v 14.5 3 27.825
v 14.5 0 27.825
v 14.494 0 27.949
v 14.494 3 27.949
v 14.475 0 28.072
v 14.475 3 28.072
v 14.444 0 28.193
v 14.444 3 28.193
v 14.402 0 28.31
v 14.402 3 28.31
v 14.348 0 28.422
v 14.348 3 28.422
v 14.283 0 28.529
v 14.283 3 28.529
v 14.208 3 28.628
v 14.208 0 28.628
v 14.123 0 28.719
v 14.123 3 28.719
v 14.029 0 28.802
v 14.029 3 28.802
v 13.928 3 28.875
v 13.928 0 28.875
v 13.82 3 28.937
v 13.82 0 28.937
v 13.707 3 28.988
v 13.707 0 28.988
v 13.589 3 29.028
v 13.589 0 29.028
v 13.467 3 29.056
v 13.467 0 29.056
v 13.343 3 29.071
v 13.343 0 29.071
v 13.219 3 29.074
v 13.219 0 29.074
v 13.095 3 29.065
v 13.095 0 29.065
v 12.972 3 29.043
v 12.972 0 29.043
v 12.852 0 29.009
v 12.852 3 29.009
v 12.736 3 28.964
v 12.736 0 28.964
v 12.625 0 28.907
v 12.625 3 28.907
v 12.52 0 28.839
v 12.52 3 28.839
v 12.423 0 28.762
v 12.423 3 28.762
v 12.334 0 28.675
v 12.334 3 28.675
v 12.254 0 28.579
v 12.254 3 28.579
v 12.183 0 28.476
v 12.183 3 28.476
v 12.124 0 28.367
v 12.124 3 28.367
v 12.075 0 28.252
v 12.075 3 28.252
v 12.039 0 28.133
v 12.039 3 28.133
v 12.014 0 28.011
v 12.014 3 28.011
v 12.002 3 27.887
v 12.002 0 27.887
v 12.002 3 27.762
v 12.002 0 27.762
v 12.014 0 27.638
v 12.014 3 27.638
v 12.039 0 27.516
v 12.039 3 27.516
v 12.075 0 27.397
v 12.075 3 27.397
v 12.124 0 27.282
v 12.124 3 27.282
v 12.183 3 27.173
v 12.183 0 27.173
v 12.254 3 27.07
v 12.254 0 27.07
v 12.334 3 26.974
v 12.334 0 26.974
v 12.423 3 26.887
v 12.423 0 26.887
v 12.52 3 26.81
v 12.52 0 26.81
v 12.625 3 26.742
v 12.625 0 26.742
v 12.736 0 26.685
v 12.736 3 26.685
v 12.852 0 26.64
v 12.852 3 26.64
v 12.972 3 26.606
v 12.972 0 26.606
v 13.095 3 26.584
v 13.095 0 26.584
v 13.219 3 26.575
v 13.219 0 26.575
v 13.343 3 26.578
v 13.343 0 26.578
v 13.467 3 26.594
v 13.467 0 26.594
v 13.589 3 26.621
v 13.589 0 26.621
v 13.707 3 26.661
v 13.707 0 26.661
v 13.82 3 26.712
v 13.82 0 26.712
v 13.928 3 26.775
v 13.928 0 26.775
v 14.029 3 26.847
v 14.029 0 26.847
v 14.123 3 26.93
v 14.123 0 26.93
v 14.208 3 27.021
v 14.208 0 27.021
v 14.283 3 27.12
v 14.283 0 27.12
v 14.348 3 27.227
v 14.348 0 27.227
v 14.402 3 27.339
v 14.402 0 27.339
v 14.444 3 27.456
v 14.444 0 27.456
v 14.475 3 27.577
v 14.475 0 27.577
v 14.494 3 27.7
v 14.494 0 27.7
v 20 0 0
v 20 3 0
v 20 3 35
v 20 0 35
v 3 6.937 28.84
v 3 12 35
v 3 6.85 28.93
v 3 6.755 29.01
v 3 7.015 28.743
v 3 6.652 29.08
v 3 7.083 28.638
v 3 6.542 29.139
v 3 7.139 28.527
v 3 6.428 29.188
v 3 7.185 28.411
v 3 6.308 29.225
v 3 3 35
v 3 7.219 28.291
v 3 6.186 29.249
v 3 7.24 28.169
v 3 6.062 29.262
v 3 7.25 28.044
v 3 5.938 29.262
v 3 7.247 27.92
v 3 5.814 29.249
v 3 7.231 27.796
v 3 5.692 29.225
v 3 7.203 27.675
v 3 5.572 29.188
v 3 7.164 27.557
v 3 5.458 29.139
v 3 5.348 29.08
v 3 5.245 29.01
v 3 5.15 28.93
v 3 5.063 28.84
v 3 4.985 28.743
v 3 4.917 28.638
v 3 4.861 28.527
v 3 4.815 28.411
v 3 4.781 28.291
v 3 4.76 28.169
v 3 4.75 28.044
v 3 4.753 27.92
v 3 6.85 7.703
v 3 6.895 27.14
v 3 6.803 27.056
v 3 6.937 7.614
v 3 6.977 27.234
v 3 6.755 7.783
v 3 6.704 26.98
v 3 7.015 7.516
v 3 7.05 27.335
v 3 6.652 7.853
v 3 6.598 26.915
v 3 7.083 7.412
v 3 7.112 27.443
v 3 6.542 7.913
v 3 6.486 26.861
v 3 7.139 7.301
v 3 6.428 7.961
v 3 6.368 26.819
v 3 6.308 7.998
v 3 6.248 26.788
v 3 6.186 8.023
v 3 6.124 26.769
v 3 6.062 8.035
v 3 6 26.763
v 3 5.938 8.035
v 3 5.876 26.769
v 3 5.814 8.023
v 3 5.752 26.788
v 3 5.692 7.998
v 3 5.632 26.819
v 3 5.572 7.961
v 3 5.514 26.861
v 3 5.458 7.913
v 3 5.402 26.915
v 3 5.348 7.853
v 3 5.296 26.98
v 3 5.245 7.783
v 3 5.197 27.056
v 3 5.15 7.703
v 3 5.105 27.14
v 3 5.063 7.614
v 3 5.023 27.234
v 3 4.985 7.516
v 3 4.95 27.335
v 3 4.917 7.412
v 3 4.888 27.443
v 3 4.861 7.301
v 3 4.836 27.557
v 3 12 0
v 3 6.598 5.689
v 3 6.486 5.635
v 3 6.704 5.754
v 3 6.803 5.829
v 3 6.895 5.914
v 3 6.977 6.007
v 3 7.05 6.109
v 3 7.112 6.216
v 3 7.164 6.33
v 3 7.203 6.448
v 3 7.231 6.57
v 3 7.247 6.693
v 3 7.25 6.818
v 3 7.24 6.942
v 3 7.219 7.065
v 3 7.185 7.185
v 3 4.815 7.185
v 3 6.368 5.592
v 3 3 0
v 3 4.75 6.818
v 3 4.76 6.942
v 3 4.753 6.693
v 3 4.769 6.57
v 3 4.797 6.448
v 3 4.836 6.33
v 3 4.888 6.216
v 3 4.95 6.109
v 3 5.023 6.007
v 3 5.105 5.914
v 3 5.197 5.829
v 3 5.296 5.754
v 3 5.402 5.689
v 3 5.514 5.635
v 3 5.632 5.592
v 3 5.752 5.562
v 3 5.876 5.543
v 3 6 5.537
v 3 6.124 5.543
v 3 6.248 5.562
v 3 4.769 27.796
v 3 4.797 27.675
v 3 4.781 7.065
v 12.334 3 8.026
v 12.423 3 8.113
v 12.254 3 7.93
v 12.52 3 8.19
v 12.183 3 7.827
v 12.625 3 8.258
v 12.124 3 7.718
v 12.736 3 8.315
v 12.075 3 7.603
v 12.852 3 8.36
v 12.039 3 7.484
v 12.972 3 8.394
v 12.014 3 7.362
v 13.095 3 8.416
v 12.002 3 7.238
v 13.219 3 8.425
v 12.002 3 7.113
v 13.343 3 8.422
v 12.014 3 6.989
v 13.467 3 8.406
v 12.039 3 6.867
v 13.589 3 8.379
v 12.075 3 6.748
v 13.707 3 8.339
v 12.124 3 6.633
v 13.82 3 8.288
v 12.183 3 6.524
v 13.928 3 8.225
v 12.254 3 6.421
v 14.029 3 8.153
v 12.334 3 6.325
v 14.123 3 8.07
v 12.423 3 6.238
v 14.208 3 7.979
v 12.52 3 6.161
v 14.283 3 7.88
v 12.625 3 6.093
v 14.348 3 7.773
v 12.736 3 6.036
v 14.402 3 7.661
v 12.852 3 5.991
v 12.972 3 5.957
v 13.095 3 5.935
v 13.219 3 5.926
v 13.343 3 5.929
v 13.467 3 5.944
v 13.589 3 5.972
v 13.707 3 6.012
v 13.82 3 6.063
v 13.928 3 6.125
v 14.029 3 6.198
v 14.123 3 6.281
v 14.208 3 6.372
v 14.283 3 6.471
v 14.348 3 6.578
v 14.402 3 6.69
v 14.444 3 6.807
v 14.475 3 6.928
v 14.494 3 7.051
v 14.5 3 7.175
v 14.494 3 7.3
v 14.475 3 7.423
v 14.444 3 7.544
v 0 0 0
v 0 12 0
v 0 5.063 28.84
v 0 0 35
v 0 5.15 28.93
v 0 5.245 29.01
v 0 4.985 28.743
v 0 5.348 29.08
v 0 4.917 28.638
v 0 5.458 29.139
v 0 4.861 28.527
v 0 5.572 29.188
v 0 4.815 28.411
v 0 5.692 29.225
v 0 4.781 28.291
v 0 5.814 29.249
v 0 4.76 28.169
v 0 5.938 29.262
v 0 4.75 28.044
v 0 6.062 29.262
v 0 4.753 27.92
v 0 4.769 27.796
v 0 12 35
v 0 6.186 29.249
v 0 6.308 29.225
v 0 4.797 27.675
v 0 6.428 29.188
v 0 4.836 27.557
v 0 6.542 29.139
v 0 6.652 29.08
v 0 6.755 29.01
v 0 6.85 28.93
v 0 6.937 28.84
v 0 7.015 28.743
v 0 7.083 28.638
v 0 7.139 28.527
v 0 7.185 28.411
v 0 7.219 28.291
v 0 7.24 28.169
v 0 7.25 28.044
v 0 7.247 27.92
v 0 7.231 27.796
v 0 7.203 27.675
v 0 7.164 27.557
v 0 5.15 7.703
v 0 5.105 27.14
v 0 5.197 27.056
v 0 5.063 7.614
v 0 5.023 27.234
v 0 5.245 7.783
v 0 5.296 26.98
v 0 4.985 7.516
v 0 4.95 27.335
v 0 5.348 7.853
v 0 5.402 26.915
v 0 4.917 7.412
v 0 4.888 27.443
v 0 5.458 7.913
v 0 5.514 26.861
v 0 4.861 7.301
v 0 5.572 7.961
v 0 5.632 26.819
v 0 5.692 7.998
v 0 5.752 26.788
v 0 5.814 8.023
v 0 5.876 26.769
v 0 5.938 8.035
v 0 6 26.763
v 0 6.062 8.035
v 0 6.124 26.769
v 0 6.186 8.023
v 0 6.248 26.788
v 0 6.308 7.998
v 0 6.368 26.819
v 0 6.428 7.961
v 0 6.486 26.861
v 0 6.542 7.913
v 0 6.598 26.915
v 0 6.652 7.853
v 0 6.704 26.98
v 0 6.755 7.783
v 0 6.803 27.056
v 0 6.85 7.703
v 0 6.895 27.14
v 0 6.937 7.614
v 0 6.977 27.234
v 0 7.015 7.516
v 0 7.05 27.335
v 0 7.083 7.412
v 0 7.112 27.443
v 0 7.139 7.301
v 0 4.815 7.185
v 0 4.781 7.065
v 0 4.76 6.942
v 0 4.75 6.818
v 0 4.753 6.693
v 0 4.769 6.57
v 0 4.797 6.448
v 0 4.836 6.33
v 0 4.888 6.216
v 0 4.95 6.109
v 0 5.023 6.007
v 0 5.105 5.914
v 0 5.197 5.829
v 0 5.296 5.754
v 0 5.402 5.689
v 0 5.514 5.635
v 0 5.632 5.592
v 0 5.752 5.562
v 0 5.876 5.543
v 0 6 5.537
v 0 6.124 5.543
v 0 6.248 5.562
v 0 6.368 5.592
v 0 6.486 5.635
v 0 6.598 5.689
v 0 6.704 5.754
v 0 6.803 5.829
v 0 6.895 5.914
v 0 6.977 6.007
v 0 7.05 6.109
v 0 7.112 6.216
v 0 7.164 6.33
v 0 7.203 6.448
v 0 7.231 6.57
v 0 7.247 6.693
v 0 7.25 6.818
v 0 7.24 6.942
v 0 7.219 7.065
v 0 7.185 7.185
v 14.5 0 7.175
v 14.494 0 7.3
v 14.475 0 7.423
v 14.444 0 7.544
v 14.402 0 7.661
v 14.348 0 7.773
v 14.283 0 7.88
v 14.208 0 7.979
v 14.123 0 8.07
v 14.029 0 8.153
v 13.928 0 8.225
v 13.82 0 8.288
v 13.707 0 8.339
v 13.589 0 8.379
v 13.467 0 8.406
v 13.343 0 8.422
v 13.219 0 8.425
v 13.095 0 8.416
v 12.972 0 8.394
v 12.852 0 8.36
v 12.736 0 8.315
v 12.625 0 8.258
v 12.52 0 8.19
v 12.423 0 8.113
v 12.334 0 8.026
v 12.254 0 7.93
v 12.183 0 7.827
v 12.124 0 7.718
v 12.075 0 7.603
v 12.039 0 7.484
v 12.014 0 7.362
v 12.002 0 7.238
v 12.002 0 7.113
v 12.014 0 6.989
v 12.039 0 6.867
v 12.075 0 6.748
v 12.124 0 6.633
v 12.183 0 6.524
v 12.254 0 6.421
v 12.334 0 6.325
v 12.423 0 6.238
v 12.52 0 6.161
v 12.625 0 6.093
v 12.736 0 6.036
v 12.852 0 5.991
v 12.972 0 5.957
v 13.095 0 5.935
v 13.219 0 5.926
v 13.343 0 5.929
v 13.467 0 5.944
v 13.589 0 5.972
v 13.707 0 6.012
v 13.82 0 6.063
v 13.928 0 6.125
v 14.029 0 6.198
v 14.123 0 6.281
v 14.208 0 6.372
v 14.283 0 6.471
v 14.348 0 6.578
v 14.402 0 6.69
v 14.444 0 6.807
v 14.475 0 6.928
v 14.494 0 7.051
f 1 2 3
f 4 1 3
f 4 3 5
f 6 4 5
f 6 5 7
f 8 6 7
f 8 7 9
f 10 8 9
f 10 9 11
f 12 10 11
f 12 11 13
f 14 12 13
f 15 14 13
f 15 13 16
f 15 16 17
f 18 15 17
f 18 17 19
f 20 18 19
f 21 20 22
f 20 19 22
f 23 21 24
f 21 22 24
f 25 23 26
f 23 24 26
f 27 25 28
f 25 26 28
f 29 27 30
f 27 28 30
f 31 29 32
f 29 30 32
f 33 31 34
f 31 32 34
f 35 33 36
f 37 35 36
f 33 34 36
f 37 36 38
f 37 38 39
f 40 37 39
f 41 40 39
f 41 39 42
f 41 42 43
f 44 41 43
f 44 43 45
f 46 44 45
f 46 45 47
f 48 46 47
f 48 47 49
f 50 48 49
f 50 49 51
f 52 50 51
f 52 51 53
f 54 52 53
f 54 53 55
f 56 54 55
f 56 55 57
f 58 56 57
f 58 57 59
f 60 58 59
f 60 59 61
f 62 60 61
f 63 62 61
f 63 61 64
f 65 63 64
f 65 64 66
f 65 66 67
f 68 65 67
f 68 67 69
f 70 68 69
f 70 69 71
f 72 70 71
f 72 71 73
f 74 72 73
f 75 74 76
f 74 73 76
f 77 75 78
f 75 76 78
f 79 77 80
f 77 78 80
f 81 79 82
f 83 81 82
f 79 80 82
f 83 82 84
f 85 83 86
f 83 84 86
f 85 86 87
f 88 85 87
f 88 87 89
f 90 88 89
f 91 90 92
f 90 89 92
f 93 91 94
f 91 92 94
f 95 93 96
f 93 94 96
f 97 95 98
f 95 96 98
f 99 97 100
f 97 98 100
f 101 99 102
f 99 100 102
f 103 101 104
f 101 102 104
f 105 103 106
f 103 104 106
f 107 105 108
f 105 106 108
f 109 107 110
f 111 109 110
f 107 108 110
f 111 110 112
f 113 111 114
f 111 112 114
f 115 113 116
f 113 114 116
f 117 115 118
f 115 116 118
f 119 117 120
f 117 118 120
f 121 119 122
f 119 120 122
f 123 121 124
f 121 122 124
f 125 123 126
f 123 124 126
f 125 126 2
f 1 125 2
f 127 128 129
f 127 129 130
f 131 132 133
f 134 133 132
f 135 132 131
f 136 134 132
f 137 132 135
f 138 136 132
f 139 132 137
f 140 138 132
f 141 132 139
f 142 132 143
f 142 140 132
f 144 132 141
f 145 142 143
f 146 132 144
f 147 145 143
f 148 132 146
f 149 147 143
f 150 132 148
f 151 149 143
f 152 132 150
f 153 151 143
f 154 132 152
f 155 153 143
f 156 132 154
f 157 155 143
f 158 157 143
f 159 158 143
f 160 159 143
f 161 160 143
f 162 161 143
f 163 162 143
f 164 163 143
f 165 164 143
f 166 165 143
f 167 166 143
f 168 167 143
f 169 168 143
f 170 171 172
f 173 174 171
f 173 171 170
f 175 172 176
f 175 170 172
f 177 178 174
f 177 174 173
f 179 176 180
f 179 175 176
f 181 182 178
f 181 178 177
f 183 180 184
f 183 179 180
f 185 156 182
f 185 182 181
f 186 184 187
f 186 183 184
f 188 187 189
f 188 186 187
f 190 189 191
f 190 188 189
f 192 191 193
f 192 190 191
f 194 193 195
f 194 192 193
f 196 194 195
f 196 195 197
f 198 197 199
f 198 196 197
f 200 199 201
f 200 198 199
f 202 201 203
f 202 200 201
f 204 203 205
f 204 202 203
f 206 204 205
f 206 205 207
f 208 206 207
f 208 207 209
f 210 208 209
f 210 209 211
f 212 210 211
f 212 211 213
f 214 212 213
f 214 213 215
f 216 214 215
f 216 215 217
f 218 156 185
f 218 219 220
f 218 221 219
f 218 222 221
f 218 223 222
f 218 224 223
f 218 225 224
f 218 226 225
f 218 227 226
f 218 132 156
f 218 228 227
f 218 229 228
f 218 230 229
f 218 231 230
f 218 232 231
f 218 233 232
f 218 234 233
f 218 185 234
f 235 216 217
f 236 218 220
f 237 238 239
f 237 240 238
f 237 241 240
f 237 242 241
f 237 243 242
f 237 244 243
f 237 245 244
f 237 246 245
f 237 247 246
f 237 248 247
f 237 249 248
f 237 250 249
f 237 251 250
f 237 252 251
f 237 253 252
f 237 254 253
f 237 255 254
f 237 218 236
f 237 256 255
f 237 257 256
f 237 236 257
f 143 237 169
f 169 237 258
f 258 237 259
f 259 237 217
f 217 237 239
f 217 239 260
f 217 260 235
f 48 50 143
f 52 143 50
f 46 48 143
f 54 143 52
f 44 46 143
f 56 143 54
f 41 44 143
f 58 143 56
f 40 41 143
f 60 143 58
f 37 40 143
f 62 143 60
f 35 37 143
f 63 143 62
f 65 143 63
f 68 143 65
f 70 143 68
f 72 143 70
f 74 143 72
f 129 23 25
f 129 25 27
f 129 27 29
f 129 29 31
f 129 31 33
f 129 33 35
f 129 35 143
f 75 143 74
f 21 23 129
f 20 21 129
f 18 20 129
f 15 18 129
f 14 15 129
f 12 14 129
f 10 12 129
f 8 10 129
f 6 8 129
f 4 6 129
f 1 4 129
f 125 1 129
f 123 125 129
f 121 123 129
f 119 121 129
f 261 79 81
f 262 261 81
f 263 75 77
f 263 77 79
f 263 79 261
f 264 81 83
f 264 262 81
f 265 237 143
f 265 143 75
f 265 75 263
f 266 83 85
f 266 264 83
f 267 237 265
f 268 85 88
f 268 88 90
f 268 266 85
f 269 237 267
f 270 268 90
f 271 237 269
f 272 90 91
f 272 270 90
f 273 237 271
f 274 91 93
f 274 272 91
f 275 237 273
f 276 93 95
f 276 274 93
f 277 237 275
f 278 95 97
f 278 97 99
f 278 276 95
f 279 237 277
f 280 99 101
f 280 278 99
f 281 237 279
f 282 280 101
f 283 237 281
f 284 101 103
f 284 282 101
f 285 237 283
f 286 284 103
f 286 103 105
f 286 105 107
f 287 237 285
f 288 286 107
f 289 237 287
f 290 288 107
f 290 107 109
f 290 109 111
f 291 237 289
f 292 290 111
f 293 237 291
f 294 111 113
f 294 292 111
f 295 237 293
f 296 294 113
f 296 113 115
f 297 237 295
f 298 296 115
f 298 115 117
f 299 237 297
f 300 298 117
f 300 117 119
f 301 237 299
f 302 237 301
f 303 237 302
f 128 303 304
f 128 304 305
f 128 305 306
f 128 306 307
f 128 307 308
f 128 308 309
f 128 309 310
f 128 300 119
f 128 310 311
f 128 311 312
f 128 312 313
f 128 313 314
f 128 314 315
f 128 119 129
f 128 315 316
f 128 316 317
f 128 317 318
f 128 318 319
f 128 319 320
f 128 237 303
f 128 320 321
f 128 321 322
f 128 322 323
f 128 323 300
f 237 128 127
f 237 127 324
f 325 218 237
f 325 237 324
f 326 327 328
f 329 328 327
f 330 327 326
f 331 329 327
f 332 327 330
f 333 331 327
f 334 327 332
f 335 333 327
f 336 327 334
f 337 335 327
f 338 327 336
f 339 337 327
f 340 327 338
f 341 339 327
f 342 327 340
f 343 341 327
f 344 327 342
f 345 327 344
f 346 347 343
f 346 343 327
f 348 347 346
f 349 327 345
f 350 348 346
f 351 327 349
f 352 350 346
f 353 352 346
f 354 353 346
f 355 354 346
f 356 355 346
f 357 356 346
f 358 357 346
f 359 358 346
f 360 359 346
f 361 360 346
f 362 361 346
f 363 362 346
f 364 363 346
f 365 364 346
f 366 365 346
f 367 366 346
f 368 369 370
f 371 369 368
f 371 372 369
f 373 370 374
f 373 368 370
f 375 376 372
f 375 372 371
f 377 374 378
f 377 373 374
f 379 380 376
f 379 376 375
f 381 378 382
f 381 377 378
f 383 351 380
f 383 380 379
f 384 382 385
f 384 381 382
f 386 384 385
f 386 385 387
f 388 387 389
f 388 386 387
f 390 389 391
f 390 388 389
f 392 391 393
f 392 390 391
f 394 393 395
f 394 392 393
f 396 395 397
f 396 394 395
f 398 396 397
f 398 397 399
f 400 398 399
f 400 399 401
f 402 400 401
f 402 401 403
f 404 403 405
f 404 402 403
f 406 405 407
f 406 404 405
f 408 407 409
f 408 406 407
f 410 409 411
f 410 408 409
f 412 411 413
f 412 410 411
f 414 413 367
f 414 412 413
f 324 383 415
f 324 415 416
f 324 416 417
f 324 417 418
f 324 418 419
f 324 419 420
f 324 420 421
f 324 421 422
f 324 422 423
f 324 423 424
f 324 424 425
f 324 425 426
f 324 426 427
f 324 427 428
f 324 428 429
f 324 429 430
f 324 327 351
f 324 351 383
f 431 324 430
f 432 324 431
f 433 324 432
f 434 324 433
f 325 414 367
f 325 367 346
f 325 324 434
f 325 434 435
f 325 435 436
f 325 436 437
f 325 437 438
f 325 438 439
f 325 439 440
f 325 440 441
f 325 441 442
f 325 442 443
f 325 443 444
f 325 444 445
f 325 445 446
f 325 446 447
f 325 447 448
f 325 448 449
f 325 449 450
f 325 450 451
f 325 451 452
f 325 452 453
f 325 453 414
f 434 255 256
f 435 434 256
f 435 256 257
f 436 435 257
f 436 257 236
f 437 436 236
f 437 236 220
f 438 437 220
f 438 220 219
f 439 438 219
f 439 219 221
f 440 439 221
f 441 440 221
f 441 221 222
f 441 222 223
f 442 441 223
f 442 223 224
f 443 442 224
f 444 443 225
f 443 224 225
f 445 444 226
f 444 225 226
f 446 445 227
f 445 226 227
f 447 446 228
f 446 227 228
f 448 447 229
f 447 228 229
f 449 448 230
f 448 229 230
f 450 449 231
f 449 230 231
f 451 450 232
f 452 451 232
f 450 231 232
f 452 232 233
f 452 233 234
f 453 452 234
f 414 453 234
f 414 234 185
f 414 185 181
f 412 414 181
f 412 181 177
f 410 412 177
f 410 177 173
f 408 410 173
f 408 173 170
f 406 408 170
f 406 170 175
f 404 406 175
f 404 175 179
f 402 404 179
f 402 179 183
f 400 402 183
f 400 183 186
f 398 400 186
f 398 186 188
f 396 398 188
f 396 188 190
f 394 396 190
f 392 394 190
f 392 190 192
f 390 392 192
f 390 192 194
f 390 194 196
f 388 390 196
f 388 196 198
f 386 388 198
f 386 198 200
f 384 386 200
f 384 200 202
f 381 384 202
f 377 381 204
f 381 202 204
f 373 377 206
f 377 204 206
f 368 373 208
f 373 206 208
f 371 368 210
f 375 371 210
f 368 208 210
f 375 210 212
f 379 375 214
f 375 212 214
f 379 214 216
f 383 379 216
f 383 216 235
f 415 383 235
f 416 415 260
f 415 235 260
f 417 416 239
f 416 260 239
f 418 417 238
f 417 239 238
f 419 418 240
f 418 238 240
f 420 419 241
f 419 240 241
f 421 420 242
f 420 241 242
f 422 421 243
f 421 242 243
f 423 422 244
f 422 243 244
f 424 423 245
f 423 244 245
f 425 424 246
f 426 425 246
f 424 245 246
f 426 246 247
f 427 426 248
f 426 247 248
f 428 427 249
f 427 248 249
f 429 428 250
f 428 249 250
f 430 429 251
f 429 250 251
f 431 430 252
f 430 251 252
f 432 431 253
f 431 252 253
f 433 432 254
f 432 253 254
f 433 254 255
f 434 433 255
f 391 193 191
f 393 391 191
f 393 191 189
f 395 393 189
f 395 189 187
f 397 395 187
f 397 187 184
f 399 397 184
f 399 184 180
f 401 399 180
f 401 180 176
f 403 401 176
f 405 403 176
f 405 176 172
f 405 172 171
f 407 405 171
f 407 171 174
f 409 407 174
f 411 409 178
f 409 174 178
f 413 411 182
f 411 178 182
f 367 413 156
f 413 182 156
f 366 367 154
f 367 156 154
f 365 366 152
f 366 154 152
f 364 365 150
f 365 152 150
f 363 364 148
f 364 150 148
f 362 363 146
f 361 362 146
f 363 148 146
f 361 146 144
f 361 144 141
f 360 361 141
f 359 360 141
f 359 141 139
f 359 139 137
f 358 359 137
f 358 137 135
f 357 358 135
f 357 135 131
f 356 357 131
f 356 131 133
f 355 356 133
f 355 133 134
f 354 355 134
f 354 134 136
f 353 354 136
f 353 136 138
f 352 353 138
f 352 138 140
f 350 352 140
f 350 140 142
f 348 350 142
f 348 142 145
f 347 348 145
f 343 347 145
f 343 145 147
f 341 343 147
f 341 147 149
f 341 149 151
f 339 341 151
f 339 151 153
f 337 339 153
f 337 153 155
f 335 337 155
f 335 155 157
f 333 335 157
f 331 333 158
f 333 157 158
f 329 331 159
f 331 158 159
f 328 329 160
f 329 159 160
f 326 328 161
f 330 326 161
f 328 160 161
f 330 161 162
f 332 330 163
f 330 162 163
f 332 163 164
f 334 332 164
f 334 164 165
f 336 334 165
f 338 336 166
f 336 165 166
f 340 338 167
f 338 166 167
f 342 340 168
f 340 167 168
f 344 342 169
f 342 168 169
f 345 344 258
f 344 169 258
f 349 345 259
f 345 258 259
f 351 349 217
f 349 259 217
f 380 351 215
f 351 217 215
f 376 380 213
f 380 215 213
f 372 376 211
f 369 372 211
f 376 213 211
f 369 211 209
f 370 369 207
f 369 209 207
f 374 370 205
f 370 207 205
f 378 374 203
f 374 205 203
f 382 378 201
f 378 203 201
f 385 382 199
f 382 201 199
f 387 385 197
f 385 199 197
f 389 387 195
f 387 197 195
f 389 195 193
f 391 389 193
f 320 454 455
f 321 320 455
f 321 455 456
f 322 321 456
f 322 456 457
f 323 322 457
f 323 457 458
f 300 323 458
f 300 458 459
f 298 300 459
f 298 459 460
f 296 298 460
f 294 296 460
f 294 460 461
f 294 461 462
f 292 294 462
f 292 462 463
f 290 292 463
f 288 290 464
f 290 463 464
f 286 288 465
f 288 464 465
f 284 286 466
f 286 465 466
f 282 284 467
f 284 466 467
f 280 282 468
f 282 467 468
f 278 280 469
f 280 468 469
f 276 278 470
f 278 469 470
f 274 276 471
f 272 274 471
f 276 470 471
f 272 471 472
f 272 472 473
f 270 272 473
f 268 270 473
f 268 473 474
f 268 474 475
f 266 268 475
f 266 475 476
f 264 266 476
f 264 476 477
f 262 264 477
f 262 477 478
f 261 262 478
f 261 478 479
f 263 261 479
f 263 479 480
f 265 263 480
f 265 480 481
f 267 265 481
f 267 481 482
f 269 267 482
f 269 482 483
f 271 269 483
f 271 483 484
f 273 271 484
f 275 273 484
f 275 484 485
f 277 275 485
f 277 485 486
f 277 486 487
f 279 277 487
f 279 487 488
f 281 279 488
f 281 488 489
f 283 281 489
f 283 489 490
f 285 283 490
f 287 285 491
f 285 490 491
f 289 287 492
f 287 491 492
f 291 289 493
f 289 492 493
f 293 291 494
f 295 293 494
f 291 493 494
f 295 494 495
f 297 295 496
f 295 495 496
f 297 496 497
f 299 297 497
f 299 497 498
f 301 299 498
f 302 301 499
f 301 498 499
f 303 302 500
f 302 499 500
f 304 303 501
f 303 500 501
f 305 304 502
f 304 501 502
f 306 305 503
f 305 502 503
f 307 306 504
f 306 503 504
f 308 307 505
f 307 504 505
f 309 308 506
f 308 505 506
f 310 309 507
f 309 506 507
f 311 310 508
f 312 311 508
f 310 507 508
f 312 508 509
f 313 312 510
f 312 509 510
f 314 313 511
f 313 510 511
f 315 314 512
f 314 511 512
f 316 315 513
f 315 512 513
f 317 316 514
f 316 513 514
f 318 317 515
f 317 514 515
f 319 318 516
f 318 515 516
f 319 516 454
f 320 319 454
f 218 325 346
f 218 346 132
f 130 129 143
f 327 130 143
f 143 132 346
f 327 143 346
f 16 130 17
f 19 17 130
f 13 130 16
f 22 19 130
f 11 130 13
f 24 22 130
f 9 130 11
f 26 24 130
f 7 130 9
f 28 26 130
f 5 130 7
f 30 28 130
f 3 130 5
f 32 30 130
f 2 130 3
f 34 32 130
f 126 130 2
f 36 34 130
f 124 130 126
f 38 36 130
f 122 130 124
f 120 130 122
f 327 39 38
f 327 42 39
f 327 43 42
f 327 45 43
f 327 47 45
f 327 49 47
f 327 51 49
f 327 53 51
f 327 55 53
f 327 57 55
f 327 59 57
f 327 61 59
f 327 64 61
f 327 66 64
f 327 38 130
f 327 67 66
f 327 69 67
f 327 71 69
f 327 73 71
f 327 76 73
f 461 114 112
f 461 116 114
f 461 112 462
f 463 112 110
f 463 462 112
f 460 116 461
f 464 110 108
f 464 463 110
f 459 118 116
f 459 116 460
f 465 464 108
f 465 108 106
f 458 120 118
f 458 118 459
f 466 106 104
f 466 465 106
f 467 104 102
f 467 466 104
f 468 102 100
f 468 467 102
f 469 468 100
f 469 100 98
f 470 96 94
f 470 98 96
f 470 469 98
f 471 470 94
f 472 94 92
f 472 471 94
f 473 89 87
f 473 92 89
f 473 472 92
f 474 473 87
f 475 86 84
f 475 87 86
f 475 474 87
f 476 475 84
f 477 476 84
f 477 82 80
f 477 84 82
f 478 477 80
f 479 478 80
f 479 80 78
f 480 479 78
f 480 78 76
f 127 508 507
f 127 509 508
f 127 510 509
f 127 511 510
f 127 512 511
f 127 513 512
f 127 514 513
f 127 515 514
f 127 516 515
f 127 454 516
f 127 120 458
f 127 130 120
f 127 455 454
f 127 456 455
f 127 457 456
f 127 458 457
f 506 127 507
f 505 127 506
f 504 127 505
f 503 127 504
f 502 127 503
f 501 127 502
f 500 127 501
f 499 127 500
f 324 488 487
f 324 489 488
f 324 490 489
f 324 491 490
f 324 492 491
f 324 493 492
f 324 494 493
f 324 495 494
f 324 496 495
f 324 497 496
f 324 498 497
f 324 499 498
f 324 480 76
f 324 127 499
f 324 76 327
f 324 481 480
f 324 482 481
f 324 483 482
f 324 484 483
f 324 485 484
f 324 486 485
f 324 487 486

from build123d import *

# Parameters (mm, degrees)
BOSS_EXTRU_1_DEPTH    = 35
TROU_TARAUD_M31_D     = 2.5
TROU_TARAUD_M31_DEPTH = 4.9
TROU_TARAUD_M31_TIP   = 0.751075774
TROU_TARAUD_M32_D     = 2.5
TROU_TARAUD_M32_DEPTH = 4.9
TROU_TARAUD_M32_TIP   = 0.751075774


with BuildPart() as part:
    # Esquisse1 → Boss.-Extru.1 (new body)
    with BuildSketch(Plane.XY):
        Polygon((0, 0), (0, 12), (3, 12), (3, 3), (20, 3), (20, 0), align=None)
    extrude(amount=BOSS_EXTRU_1_DEPTH)

    # Trou taraudé M31
    with Locations(Plane(origin=(0, 3, 0), x_dir=(-1, 0, 0), z_dir=(0, 1, 0))):
        with Locations((-13.25, 27.824573519), (-13.25, 7.175426481)):
            Hole(TROU_TARAUD_M31_D / 2, depth=TROU_TARAUD_M31_DEPTH)
            with Locations((0, 0, -(TROU_TARAUD_M31_DEPTH + TROU_TARAUD_M31_TIP / 2))):  # 118° drill point
                Cone(0, TROU_TARAUD_M31_D / 2, TROU_TARAUD_M31_TIP, mode=Mode.SUBTRACT)

    # Trou taraudé M32
    with Locations(Plane.ZY):
        with Locations((6.786751346, 6), (28.013248654, 6)):
            Hole(TROU_TARAUD_M32_D / 2, depth=TROU_TARAUD_M32_DEPTH)
            with Locations((0, 0, -(TROU_TARAUD_M32_DEPTH + TROU_TARAUD_M32_TIP / 2))):  # 118° drill point
                Cone(0, TROU_TARAUD_M32_D / 2, TROU_TARAUD_M32_TIP, mode=Mode.SUBTRACT)


solid = part.part
